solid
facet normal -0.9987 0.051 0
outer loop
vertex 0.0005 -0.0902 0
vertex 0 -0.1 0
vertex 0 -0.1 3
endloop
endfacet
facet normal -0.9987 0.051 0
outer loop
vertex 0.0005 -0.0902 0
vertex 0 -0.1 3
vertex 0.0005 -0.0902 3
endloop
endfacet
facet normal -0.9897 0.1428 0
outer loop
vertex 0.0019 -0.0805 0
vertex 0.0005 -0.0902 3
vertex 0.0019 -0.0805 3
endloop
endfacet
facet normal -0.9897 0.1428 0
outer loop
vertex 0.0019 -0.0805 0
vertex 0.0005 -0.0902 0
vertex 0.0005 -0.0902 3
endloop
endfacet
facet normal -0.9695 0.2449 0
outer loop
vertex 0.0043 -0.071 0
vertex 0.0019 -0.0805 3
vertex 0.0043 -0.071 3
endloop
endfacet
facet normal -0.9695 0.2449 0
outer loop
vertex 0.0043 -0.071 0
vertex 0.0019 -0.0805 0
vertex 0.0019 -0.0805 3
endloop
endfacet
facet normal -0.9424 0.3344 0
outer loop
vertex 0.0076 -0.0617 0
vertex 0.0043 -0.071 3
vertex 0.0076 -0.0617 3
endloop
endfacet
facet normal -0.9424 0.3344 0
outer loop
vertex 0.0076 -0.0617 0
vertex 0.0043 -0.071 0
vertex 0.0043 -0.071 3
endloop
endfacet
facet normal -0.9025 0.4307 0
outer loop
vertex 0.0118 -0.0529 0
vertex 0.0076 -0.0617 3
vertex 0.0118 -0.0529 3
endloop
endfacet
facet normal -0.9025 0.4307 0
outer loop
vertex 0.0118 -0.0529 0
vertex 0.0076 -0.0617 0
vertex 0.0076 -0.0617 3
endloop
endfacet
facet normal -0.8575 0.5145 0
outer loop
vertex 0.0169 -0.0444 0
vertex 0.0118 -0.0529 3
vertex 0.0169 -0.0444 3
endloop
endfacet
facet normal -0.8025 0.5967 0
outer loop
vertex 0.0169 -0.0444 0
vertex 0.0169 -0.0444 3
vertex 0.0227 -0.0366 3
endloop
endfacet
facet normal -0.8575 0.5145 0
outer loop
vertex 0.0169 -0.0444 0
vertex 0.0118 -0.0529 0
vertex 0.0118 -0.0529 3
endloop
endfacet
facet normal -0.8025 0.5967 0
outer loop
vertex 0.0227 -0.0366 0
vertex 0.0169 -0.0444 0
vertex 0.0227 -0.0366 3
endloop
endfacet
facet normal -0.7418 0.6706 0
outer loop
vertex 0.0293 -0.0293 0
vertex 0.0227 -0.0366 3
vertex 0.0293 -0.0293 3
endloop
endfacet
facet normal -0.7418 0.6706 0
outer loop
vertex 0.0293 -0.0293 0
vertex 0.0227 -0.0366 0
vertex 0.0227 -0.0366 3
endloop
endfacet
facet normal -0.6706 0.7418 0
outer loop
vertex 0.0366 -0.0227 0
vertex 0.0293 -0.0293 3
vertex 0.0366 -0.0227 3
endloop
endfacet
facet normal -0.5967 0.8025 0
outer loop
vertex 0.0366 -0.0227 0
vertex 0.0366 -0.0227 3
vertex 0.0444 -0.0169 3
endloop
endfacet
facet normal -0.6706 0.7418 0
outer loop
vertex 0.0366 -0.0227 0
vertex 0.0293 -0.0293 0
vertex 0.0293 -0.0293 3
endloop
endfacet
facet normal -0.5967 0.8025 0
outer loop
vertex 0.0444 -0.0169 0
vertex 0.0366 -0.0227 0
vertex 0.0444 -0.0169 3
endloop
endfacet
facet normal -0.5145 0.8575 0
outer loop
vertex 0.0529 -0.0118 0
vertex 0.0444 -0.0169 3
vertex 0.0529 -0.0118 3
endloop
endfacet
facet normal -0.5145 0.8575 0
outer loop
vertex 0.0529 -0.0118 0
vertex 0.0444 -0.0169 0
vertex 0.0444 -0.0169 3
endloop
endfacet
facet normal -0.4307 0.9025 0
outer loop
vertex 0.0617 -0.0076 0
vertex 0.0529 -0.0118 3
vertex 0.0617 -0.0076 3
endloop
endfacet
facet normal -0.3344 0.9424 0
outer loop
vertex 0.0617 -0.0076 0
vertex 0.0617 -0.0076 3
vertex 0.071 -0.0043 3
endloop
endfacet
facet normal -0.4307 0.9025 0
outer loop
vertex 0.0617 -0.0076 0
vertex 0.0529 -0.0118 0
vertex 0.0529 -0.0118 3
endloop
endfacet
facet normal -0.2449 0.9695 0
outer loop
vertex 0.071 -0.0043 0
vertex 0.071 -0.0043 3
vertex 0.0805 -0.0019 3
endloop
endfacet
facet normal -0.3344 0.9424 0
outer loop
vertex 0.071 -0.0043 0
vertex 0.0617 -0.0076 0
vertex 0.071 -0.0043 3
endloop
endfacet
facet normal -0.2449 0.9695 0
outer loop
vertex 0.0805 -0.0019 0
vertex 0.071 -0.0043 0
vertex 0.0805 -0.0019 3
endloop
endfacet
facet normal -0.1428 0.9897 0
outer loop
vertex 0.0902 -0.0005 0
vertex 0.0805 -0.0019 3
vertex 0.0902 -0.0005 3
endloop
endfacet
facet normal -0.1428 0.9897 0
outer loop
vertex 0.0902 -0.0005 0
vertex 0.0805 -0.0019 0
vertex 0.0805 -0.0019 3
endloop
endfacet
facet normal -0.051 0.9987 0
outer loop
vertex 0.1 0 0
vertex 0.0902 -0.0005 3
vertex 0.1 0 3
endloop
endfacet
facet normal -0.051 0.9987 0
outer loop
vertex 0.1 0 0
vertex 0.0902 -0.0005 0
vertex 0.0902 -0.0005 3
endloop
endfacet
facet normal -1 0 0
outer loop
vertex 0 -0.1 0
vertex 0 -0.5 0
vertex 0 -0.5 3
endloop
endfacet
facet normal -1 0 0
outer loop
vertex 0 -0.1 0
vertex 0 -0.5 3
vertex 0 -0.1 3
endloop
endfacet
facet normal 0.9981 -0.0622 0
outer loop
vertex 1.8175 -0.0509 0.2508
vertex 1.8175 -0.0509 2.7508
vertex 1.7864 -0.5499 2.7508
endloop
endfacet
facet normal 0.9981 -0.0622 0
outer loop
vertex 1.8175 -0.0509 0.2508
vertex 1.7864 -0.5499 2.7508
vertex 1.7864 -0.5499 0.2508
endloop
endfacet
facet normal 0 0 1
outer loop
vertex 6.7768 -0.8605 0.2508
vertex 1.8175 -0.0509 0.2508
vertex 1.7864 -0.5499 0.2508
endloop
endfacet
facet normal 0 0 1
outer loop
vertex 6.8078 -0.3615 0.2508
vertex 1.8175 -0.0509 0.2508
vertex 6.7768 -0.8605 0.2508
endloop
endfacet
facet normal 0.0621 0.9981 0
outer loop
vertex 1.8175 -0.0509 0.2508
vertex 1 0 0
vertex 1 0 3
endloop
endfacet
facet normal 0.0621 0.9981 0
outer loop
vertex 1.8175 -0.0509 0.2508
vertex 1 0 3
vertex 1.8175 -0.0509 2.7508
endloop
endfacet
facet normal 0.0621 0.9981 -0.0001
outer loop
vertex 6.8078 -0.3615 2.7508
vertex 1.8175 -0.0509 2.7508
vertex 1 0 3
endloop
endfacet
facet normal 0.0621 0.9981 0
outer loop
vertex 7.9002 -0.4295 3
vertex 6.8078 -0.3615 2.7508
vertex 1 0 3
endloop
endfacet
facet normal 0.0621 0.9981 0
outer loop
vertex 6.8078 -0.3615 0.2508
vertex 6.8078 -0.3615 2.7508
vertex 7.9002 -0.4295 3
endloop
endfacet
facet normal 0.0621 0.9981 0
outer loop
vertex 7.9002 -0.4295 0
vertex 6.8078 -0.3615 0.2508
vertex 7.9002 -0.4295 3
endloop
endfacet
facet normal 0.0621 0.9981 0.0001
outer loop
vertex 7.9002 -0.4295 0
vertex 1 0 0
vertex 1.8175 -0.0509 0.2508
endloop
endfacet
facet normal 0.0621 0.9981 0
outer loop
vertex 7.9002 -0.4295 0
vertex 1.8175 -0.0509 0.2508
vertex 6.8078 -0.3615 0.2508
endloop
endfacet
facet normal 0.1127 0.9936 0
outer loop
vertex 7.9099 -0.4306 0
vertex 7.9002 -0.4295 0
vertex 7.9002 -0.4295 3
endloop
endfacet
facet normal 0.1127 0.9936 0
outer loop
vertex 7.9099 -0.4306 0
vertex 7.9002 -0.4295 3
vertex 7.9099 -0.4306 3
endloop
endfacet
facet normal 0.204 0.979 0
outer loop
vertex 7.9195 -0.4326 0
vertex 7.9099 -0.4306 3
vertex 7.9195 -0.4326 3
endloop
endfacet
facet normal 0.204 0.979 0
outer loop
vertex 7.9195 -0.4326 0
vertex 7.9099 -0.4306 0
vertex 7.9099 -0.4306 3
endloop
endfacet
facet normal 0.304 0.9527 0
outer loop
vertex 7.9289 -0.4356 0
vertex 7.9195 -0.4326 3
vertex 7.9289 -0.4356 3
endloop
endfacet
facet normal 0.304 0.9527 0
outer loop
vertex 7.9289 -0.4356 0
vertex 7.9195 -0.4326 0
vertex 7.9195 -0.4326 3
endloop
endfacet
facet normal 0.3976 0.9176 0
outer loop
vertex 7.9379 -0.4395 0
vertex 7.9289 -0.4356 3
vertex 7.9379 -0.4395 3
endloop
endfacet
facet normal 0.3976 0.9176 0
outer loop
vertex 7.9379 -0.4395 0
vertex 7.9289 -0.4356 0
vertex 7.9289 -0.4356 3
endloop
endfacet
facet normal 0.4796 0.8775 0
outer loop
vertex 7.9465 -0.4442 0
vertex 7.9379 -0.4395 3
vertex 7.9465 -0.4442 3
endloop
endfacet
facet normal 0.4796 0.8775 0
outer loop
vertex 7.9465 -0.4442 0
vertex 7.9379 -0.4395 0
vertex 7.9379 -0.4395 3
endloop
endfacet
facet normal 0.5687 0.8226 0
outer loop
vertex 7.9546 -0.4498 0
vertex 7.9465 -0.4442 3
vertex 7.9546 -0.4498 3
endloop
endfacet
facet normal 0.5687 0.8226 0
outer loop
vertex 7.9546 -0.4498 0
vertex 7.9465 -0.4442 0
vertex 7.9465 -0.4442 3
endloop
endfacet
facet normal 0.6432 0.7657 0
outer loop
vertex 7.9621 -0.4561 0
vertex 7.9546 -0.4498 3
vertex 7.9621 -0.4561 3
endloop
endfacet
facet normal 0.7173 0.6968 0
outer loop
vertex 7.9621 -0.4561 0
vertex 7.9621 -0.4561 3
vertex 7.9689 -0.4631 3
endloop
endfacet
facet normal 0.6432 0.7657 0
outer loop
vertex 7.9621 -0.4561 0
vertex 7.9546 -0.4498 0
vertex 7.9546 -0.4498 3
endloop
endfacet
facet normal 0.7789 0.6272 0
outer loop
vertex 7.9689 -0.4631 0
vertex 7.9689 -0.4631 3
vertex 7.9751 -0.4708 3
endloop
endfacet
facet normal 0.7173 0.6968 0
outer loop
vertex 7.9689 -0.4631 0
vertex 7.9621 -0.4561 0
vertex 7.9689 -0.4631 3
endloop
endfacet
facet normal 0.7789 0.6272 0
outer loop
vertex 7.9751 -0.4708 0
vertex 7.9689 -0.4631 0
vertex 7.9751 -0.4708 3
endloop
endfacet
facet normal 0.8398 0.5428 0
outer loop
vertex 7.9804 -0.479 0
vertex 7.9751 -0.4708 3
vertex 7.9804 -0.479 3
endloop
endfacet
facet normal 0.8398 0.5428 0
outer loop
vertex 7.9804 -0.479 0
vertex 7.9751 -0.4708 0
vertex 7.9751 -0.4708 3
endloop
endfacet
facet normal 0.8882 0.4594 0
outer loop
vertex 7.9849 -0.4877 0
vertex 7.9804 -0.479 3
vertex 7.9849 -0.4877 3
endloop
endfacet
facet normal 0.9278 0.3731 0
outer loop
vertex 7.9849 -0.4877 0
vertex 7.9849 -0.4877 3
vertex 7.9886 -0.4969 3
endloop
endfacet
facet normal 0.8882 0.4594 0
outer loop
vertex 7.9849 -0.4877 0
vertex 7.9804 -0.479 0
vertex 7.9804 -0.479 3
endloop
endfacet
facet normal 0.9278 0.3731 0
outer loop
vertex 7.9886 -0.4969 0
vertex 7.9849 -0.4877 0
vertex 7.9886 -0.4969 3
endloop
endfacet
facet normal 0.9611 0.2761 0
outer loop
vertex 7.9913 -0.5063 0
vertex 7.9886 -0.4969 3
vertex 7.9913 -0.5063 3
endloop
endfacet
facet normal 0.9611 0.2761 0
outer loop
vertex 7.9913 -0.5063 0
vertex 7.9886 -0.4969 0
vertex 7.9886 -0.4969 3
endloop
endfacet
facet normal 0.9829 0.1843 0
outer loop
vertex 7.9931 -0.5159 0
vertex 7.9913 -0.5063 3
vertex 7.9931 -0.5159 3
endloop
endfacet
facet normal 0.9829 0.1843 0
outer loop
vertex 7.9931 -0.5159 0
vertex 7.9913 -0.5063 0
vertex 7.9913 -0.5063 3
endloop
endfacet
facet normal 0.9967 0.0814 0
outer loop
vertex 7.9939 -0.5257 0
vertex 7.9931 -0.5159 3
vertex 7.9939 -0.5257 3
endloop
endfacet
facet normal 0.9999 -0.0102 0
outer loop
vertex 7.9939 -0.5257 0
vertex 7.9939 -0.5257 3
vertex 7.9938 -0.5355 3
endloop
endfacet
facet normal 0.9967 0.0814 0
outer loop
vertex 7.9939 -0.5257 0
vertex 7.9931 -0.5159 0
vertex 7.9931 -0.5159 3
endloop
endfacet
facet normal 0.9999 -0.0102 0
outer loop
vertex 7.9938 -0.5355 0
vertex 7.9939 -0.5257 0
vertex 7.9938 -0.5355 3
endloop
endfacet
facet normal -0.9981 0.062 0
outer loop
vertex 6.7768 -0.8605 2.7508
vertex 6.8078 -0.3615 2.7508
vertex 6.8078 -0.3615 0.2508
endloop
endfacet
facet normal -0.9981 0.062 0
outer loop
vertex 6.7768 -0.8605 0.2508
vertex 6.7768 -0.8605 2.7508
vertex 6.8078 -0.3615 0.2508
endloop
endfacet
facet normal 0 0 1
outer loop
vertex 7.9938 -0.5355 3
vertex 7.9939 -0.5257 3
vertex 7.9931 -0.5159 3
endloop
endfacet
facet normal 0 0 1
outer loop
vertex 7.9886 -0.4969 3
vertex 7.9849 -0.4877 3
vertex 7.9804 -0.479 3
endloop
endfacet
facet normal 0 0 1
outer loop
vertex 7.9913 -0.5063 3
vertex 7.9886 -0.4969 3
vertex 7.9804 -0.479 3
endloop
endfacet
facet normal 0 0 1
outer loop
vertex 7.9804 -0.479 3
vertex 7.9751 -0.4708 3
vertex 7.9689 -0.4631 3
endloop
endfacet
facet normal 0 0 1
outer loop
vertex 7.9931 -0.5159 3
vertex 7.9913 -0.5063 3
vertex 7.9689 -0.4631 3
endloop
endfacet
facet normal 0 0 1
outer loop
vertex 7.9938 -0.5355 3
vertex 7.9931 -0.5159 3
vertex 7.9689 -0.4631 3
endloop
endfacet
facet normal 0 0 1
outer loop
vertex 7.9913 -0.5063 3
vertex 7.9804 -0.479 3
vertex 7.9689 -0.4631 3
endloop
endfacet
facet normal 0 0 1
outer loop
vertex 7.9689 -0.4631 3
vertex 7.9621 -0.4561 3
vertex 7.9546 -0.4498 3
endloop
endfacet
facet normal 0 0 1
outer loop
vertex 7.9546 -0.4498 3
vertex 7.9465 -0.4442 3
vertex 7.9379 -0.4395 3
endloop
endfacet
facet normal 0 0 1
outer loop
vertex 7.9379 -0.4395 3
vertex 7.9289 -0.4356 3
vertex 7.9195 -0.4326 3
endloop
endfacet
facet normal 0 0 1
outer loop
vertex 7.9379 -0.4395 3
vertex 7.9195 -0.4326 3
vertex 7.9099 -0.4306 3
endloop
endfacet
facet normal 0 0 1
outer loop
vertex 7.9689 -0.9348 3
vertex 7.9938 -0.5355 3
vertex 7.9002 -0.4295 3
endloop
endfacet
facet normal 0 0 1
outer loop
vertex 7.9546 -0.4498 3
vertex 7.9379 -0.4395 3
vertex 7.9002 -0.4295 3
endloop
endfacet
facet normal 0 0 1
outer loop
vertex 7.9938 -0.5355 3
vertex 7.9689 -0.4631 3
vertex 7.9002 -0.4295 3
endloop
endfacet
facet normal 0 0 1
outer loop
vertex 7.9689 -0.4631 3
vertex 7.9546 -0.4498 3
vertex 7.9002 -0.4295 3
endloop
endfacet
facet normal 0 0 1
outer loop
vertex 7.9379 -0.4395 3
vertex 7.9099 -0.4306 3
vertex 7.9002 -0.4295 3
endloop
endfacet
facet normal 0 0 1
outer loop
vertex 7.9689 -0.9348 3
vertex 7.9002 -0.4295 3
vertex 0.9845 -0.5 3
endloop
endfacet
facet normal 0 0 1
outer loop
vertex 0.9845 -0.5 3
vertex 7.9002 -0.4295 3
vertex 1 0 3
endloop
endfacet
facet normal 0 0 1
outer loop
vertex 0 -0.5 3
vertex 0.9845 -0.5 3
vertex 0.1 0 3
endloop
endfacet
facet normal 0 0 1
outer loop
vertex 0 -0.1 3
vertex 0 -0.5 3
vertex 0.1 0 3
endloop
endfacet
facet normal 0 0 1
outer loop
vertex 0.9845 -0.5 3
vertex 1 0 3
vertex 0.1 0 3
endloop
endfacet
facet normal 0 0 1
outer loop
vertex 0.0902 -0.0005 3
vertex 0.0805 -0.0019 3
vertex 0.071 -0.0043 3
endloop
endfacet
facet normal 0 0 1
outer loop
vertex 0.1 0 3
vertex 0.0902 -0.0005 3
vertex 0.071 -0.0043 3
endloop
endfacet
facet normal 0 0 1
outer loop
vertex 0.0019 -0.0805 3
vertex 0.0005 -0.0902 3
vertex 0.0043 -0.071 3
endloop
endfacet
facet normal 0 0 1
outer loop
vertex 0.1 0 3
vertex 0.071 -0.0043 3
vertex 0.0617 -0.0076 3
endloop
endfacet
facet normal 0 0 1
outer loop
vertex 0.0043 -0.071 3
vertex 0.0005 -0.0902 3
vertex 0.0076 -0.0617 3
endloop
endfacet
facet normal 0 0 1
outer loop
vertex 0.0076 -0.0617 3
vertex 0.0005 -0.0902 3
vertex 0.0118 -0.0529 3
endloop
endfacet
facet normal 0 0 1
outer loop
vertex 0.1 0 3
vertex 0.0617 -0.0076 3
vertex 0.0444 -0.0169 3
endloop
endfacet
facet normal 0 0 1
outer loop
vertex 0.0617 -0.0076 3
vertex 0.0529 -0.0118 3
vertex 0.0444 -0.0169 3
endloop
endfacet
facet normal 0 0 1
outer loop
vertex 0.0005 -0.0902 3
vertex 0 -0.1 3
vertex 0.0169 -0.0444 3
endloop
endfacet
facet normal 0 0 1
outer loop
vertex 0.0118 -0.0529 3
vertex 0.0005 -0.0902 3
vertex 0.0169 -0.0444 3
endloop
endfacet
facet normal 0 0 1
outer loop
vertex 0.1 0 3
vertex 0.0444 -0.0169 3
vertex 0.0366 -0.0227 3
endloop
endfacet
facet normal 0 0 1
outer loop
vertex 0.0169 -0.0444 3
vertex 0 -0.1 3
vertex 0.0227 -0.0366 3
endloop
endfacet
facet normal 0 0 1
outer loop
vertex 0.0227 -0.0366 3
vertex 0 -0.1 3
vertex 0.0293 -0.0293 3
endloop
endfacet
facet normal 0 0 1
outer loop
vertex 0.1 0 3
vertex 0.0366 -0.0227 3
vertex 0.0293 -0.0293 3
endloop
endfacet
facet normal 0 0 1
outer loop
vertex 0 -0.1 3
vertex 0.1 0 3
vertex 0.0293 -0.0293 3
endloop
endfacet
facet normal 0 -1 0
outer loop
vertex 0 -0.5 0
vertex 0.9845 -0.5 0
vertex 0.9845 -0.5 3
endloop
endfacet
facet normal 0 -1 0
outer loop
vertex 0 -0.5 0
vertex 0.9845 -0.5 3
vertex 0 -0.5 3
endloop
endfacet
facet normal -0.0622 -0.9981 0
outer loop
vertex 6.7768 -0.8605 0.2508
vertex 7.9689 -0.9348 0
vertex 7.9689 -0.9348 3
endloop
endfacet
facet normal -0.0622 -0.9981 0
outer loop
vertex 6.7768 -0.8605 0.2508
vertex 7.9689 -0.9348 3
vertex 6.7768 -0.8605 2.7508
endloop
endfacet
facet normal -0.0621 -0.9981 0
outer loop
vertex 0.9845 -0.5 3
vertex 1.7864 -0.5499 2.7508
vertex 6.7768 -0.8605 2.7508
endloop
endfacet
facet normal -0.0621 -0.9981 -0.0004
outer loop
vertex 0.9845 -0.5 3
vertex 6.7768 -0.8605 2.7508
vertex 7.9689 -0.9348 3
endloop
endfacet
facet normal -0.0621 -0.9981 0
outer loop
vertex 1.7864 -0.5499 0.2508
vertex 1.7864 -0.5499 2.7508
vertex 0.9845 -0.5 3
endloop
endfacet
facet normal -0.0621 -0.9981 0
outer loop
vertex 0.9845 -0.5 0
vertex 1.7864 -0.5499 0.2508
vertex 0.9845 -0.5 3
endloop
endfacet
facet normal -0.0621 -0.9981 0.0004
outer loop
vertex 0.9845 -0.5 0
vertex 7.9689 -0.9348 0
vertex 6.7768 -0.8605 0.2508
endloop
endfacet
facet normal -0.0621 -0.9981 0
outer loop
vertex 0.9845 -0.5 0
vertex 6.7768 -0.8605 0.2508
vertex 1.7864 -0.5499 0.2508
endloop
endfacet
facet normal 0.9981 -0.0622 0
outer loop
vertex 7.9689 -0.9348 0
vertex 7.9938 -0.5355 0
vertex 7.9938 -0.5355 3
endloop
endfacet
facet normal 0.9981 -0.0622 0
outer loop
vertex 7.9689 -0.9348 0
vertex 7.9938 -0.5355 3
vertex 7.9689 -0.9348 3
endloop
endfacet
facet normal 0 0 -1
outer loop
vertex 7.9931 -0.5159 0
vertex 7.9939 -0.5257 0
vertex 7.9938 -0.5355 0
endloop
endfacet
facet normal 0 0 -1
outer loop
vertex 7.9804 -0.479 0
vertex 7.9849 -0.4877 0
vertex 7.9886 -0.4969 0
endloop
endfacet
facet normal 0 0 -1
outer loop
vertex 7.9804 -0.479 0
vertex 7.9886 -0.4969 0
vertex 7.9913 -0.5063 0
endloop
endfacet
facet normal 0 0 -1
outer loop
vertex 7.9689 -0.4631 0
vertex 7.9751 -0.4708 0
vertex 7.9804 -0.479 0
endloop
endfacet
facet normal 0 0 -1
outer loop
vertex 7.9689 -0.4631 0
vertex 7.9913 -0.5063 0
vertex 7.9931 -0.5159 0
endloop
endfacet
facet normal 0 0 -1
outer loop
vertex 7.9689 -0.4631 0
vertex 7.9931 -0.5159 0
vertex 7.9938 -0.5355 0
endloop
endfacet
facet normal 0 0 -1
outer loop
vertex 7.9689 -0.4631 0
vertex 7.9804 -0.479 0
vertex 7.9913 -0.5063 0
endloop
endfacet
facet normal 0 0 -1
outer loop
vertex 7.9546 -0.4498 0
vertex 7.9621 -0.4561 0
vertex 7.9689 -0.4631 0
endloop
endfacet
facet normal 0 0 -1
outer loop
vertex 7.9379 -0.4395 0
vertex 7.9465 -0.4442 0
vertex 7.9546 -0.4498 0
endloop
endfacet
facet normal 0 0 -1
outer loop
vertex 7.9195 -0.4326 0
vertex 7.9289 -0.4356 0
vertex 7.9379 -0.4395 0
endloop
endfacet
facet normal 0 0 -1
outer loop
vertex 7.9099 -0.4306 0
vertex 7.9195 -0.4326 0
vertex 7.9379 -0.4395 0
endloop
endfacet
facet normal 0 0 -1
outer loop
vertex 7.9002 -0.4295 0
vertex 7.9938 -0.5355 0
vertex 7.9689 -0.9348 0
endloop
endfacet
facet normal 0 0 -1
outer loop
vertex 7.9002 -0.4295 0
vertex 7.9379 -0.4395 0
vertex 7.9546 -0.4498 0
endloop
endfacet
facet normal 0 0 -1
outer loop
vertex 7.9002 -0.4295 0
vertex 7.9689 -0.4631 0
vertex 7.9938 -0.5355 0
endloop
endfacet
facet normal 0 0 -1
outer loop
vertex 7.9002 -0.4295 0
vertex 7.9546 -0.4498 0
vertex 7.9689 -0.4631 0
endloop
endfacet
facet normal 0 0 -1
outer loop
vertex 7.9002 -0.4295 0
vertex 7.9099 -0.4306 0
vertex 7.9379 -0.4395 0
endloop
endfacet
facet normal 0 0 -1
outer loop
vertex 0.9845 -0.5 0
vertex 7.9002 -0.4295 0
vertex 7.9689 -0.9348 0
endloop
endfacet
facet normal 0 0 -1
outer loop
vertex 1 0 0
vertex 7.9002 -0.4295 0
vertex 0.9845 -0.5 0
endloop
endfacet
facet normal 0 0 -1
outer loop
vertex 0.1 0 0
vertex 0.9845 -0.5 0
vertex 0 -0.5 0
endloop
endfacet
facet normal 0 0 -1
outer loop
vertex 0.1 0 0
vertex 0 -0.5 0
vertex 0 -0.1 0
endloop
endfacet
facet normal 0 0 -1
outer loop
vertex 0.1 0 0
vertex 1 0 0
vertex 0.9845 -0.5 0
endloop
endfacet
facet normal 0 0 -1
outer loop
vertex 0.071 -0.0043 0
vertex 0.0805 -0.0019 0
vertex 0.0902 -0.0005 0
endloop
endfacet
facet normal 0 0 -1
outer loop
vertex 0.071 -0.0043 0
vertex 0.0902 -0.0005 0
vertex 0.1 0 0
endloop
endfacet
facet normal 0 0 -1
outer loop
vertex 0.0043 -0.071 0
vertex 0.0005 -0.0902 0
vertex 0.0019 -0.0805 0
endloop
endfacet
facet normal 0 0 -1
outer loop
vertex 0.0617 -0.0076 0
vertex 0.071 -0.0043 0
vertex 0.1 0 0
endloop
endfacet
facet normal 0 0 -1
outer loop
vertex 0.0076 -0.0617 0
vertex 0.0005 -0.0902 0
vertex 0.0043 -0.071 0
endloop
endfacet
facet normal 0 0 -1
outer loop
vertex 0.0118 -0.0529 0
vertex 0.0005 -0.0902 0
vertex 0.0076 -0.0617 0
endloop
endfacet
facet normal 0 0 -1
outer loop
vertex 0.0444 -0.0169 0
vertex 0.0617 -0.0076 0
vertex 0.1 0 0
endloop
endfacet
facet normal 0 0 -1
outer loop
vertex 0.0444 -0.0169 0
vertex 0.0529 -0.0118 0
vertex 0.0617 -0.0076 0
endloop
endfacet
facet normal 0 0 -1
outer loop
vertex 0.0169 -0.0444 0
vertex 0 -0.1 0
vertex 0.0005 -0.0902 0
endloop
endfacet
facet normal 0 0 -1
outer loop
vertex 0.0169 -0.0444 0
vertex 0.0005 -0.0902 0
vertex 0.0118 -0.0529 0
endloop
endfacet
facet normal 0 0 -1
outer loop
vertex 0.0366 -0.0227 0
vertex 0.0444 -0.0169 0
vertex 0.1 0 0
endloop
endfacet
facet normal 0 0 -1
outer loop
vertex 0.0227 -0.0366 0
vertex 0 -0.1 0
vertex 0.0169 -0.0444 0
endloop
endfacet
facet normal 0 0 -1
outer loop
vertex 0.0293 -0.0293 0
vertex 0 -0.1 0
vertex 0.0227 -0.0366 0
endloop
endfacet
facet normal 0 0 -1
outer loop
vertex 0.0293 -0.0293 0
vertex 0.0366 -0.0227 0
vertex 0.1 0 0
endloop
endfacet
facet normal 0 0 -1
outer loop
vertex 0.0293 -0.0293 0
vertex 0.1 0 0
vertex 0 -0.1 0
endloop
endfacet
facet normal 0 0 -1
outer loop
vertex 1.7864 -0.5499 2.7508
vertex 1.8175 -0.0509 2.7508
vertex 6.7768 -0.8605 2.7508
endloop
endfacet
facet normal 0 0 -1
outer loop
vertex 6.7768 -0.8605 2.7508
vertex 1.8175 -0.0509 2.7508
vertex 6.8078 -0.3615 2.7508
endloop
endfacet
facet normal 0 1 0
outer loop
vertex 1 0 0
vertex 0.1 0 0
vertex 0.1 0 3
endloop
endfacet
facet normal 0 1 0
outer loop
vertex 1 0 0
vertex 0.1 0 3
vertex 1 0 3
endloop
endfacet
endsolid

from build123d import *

# Parameters (mm, degrees)
BOSS_EXTRUDE3_DEPTH = 3
SKETCH3_W           = 5
SKETCH3_H           = 2.5
CUT_EXTRUDE1_DEPTH  = 3


with BuildPart() as part:
    # Sketch2 → Boss-Extrude3 (new body)
    with BuildSketch(Plane.XY):
        with BuildLine():
            Line((0.1, 0), (1, 0))
            Line((1, 0), (7.900193166, -0.429508089))
            ThreePointArc((7.900193166, -0.429508089), (7.968947639, -0.463133775), (7.993787443, -0.53552748))
            Line((7.993787443, -0.53552748), (7.968937216, -0.934754817))
            Line((7.968937216, -0.934754817), (0.984453593, -0.5))
            Line((0.984453593, -0.5), (0, -0.5))
            Line((0, -0.5), (0, -0.1))
            ThreePointArc((0, -0.1), (0.029289322, -0.029289322), (0.1, 0))
        make_face()
    extrude(amount=BOSS_EXTRUDE3_DEPTH)

    # Sketch3 → Cut-Extrude1 (cut)
    with BuildSketch(Plane(origin=(0.003859586, 0.062005564, 0), x_dir=(0.998068341, -0.062125569, 0), z_dir=(0.062125569, 0.998068341, 0))):
        with Locations((4.317122221, -1.500788282)):
            Rectangle(SKETCH3_W, SKETCH3_H)
    extrude(amount=-CUT_EXTRUDE1_DEPTH, mode=Mode.SUBTRACT)


solid = part.part
